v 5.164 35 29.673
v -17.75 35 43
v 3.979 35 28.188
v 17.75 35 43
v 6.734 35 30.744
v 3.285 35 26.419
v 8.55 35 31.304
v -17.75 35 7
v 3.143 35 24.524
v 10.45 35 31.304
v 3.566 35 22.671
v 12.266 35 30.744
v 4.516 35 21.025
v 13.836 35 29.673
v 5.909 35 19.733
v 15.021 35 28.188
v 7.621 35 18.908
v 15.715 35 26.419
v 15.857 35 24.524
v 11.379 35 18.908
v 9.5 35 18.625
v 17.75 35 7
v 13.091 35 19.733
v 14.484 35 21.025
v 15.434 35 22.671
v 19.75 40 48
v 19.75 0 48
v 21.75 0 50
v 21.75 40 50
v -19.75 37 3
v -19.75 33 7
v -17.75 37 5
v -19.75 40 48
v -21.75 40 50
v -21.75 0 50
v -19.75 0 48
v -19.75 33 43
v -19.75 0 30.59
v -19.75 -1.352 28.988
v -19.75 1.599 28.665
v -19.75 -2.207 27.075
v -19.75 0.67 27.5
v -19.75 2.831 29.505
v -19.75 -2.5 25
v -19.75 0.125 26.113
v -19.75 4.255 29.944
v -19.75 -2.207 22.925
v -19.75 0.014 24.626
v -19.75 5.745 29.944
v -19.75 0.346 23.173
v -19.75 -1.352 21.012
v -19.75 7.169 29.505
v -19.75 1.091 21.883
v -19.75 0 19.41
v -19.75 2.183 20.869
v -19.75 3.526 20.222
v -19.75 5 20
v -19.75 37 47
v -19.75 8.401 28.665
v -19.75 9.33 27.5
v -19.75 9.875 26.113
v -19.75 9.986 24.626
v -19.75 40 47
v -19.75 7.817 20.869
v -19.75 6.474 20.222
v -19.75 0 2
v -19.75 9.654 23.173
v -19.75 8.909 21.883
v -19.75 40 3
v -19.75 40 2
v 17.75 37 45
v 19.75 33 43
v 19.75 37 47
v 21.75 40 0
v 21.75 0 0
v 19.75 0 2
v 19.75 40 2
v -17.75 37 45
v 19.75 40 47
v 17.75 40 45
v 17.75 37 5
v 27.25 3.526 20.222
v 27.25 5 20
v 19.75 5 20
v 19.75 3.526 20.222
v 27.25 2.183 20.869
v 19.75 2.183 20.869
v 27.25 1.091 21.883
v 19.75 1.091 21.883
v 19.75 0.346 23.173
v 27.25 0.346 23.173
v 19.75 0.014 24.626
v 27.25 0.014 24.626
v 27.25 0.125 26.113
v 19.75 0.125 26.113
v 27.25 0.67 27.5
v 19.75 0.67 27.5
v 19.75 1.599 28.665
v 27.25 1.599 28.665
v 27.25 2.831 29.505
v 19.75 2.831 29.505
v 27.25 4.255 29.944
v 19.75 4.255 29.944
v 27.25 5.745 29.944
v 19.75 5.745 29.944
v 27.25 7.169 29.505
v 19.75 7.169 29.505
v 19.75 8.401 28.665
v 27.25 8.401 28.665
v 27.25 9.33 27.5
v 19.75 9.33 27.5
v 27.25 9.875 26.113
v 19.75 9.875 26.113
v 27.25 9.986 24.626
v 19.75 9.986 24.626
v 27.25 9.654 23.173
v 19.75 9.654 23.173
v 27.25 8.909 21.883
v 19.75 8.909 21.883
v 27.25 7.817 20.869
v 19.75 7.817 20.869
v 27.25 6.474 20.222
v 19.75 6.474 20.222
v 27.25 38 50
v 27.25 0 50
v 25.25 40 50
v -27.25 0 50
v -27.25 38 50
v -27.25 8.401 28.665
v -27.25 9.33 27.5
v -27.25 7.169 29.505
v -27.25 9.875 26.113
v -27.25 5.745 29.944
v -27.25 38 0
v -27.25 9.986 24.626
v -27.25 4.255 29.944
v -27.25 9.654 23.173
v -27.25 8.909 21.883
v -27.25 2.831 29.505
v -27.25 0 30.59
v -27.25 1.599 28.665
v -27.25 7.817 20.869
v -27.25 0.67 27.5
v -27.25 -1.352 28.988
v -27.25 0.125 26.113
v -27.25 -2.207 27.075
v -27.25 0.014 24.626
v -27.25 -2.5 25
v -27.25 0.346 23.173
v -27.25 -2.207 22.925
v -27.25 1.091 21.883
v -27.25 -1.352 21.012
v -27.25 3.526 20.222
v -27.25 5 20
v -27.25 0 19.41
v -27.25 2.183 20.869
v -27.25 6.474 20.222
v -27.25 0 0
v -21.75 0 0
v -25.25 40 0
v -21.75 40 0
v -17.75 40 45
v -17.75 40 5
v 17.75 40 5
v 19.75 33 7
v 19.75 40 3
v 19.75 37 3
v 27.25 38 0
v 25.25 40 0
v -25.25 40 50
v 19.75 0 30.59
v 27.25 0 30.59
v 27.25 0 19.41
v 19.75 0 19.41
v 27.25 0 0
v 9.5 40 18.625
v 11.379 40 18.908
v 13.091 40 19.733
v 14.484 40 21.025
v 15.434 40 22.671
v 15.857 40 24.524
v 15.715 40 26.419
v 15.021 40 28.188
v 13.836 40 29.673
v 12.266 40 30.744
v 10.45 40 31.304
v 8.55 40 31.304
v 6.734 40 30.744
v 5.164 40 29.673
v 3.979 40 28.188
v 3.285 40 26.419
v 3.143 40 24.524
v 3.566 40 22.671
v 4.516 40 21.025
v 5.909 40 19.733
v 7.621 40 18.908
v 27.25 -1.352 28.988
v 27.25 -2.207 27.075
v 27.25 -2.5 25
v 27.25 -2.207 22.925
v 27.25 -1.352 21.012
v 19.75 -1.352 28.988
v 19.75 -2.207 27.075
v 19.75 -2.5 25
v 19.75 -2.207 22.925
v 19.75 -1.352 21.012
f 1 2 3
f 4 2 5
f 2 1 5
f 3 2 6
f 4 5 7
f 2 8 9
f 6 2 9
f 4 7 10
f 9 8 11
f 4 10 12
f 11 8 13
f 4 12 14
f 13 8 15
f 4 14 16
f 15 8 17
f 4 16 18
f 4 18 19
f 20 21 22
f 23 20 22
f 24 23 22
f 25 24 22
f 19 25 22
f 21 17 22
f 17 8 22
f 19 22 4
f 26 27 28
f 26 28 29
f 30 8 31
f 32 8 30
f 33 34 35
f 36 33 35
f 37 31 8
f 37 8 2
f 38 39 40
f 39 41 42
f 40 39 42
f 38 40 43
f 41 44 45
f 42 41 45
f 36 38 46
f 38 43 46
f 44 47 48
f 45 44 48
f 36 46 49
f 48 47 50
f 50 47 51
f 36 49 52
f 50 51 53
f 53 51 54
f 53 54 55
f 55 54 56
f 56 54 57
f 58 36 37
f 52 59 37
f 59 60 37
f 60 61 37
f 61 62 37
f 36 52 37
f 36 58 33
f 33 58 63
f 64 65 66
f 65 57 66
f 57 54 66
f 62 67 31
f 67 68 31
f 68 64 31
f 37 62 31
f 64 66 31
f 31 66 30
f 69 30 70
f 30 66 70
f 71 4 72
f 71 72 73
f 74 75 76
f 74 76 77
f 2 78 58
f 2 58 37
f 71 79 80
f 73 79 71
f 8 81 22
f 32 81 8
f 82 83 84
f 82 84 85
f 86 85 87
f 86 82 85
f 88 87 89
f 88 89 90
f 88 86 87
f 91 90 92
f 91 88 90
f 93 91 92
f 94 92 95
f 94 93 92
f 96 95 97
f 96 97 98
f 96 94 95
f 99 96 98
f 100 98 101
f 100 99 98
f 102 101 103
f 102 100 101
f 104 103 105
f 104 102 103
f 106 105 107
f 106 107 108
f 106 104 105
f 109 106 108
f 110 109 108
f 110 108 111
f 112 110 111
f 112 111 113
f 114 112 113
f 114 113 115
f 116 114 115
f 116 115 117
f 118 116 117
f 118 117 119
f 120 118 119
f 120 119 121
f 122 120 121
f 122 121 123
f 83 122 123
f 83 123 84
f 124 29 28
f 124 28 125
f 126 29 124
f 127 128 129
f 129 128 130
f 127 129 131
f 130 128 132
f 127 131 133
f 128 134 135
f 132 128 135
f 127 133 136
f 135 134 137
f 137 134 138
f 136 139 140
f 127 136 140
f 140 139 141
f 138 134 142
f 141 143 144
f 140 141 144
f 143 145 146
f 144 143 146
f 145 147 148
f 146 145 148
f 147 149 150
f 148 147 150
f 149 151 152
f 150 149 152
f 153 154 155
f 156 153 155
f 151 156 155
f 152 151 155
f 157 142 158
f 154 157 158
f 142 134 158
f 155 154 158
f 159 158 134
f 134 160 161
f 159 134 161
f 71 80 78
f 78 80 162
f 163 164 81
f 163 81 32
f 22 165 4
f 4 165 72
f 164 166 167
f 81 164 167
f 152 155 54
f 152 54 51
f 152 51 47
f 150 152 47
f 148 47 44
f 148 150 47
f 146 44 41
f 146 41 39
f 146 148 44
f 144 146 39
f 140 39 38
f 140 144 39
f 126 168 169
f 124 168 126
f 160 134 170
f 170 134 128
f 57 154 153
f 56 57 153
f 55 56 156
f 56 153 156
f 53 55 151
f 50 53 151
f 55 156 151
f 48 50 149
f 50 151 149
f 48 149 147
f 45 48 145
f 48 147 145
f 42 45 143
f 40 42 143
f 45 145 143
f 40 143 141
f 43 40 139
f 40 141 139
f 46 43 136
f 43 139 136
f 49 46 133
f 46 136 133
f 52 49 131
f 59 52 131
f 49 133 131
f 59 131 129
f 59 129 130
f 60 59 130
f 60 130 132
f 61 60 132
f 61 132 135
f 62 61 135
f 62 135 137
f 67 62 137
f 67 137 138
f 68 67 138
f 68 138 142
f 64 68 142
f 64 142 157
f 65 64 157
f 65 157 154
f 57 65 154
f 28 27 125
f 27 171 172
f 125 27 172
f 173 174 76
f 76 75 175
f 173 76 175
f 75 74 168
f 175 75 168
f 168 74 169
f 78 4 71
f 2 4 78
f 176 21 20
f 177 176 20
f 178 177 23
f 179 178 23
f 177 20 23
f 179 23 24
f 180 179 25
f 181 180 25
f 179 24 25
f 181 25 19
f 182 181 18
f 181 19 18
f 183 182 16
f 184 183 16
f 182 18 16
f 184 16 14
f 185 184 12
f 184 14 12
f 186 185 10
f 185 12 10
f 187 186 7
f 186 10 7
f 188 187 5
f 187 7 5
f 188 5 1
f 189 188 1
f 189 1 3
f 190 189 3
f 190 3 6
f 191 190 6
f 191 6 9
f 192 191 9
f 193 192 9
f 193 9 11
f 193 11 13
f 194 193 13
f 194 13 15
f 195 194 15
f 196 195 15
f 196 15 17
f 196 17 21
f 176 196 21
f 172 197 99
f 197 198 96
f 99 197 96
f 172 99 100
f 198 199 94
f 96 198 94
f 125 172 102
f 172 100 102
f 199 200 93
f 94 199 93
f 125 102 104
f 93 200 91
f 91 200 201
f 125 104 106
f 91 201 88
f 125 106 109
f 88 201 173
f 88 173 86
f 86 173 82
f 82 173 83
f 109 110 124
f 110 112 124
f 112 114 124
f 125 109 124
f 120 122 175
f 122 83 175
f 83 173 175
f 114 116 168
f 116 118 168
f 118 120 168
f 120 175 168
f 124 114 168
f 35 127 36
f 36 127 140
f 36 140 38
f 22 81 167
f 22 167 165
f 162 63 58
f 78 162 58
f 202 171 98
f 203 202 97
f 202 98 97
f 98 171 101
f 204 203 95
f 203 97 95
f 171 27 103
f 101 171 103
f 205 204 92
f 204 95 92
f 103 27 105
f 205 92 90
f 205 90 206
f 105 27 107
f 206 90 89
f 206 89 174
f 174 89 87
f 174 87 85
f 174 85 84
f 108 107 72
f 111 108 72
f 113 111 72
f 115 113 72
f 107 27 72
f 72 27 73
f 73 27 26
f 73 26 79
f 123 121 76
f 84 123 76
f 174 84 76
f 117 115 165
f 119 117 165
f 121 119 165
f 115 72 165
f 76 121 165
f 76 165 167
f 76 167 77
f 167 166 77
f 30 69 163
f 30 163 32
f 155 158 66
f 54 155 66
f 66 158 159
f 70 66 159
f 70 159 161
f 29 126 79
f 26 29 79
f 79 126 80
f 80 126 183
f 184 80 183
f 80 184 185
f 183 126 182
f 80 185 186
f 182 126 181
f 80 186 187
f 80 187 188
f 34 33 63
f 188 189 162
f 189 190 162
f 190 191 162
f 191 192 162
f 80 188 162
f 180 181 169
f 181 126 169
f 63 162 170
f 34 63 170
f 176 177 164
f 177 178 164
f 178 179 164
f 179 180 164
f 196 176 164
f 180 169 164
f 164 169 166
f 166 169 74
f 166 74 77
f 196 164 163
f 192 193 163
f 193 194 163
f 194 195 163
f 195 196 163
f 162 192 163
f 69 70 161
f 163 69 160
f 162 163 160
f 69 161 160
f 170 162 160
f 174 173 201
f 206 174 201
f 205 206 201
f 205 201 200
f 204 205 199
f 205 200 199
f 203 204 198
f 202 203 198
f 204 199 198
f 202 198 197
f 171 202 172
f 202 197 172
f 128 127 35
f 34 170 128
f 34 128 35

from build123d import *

# Parameters (mm, degrees)
BOSS_EXTRUDE1_DEPTH            = 50
CUT_EXTRUDE1_DEPTH             = 67.839827199
CUT_EXTRUDE1_DEPTH_BACK        = 67.839827199
SKETCH3_W                      = 39.5
SKETCH3_H                      = 5
CHAMFER1_SIZE                  = 2
BOSS_EXTRUDE2_DEPTH            = 7.5
CUT_EXTRUDE4_REACH             = 86.085
SKETCH5_R                      = 5
CUT_EXTRUDE4_DIRECTION_2_DEPTH = 85.084778646
SKETCH6_R                      = 6.375
CUT_EXTRUDE5_DEPTH             = 69.182200757


with BuildPart() as part:
    # Sketch1 → Boss-Extrude1 (new body)
    with BuildSketch(Plane.XY):
        Polygon((-27.25, 0), (-19.75, 0), (-19.75, 35), (19.75, 35), (19.75, 0), (27.25, 0), (27.25, 40), (-27.25, 40), align=None)
    extrude(amount=BOSS_EXTRUDE1_DEPTH)

    # Sketch3 → Cut-Extrude1 (cut, two sides: drawn at the far end of the back side and taken through both)
    with BuildSketch(Plane(origin=(0, 35, 0), x_dir=(-1, 0, 0), z_dir=(0, -1, 0)).offset(-CUT_EXTRUDE1_DEPTH_BACK)):
        with Locations((0, -2.5)):
            Rectangle(SKETCH3_W, SKETCH3_H)
        with Locations((0, -47.5)):
            Rectangle(SKETCH3_W, SKETCH3_H)
    extrude(amount=CUT_EXTRUDE1_DEPTH + CUT_EXTRUDE1_DEPTH_BACK, mode=Mode.SUBTRACT)

    # Chamfer1
    chamfer1_edges = [part.edges().sort_by_distance(p)[0] for p in [
        (-19.75, 20, 0),
        (-19.75, 20, 50),
        (-27.25, 40, 25),
        (27.25, 40, 25),
        (19.75, 20, 50),
        (19.75, 35, 25),
        (-19.75, 35, 25),
        (-19.75, 37.5, 5),
        (0, 35, 5),
        (19.75, 37.5, 5),
        (19.75, 37.5, 45),
        (0, 35, 45),
        (-19.75, 37.5, 45),
        (19.75, 20, 0),
    ]]
    chamfer(chamfer1_edges, length=CHAMFER1_SIZE)

    # Sketch4 → Boss-Extrude2 (add)
    with BuildSketch(Plane.ZY.offset(27.25)):
        with BuildLine():
            Line((30.590169944, 0), (19.409830056, 0))
            ThreePointArc((19.409830056, 0), (25, -2.5), (30.590169944, 0))
        make_face()
    boss_extrude2 = extrude(amount=-BOSS_EXTRUDE2_DEPTH)

    # Sketch5 → Cut-Extrude4 (cut, up to next)
    with BuildSketch(Plane.ZY.offset(27.25), mode=Mode.PRIVATE) as cut_extrude4_sk1:
        with Locations(Location((25, 5, 0), (0, 0, 180))):
            Circle(SKETCH5_R)
    cut_extrude4_tool1 = extrude(cut_extrude4_sk1.sketch, amount=-CUT_EXTRUDE4_REACH, mode=Mode.PRIVATE) & part.part
    cut_extrude4 = cut_extrude4_tool1.solids().sort_by_distance((-27.25, 5, 25))[0]
    add(cut_extrude4, mode=Mode.SUBTRACT)

    # Sketch5 → Cut-Extrude4 direction 2 (cut)
    with BuildSketch(Plane.ZY.offset(27.25)):
        with Locations(Location((25, 5, 0), (0, 0, 180))):
            Circle(SKETCH5_R)
    cut_extrude4_direction_2 = extrude(amount=CUT_EXTRUDE4_DIRECTION_2_DEPTH, mode=Mode.SUBTRACT)

    # Mirror1: Boss-Extrude2, Cut-Extrude4, Cut-Extrude4 direction 2 across plane
    add(boss_extrude2.mirror(Plane(origin=(0, 0, 0), x_dir=(0, 0, 1), z_dir=(1, 0, 0))))
    add(cut_extrude4.mirror(Plane(origin=(0, 0, 0), x_dir=(0, 0, 1), z_dir=(1, 0, 0))), mode=Mode.SUBTRACT)
    add(cut_extrude4_direction_2.mirror(Plane(origin=(0, 0, 0), x_dir=(0, 0, 1), z_dir=(1, 0, 0))), mode=Mode.SUBTRACT)

    # Sketch6 → Cut-Extrude5 (cut, through all)
    with BuildSketch(Plane.XZ.offset(-35)):
        with Locations(Location((9.5, 25, 0), (0, 0, 270))):
            Circle(SKETCH6_R)
    extrude(amount=-CUT_EXTRUDE5_DEPTH, mode=Mode.SUBTRACT)


solid = part.part
